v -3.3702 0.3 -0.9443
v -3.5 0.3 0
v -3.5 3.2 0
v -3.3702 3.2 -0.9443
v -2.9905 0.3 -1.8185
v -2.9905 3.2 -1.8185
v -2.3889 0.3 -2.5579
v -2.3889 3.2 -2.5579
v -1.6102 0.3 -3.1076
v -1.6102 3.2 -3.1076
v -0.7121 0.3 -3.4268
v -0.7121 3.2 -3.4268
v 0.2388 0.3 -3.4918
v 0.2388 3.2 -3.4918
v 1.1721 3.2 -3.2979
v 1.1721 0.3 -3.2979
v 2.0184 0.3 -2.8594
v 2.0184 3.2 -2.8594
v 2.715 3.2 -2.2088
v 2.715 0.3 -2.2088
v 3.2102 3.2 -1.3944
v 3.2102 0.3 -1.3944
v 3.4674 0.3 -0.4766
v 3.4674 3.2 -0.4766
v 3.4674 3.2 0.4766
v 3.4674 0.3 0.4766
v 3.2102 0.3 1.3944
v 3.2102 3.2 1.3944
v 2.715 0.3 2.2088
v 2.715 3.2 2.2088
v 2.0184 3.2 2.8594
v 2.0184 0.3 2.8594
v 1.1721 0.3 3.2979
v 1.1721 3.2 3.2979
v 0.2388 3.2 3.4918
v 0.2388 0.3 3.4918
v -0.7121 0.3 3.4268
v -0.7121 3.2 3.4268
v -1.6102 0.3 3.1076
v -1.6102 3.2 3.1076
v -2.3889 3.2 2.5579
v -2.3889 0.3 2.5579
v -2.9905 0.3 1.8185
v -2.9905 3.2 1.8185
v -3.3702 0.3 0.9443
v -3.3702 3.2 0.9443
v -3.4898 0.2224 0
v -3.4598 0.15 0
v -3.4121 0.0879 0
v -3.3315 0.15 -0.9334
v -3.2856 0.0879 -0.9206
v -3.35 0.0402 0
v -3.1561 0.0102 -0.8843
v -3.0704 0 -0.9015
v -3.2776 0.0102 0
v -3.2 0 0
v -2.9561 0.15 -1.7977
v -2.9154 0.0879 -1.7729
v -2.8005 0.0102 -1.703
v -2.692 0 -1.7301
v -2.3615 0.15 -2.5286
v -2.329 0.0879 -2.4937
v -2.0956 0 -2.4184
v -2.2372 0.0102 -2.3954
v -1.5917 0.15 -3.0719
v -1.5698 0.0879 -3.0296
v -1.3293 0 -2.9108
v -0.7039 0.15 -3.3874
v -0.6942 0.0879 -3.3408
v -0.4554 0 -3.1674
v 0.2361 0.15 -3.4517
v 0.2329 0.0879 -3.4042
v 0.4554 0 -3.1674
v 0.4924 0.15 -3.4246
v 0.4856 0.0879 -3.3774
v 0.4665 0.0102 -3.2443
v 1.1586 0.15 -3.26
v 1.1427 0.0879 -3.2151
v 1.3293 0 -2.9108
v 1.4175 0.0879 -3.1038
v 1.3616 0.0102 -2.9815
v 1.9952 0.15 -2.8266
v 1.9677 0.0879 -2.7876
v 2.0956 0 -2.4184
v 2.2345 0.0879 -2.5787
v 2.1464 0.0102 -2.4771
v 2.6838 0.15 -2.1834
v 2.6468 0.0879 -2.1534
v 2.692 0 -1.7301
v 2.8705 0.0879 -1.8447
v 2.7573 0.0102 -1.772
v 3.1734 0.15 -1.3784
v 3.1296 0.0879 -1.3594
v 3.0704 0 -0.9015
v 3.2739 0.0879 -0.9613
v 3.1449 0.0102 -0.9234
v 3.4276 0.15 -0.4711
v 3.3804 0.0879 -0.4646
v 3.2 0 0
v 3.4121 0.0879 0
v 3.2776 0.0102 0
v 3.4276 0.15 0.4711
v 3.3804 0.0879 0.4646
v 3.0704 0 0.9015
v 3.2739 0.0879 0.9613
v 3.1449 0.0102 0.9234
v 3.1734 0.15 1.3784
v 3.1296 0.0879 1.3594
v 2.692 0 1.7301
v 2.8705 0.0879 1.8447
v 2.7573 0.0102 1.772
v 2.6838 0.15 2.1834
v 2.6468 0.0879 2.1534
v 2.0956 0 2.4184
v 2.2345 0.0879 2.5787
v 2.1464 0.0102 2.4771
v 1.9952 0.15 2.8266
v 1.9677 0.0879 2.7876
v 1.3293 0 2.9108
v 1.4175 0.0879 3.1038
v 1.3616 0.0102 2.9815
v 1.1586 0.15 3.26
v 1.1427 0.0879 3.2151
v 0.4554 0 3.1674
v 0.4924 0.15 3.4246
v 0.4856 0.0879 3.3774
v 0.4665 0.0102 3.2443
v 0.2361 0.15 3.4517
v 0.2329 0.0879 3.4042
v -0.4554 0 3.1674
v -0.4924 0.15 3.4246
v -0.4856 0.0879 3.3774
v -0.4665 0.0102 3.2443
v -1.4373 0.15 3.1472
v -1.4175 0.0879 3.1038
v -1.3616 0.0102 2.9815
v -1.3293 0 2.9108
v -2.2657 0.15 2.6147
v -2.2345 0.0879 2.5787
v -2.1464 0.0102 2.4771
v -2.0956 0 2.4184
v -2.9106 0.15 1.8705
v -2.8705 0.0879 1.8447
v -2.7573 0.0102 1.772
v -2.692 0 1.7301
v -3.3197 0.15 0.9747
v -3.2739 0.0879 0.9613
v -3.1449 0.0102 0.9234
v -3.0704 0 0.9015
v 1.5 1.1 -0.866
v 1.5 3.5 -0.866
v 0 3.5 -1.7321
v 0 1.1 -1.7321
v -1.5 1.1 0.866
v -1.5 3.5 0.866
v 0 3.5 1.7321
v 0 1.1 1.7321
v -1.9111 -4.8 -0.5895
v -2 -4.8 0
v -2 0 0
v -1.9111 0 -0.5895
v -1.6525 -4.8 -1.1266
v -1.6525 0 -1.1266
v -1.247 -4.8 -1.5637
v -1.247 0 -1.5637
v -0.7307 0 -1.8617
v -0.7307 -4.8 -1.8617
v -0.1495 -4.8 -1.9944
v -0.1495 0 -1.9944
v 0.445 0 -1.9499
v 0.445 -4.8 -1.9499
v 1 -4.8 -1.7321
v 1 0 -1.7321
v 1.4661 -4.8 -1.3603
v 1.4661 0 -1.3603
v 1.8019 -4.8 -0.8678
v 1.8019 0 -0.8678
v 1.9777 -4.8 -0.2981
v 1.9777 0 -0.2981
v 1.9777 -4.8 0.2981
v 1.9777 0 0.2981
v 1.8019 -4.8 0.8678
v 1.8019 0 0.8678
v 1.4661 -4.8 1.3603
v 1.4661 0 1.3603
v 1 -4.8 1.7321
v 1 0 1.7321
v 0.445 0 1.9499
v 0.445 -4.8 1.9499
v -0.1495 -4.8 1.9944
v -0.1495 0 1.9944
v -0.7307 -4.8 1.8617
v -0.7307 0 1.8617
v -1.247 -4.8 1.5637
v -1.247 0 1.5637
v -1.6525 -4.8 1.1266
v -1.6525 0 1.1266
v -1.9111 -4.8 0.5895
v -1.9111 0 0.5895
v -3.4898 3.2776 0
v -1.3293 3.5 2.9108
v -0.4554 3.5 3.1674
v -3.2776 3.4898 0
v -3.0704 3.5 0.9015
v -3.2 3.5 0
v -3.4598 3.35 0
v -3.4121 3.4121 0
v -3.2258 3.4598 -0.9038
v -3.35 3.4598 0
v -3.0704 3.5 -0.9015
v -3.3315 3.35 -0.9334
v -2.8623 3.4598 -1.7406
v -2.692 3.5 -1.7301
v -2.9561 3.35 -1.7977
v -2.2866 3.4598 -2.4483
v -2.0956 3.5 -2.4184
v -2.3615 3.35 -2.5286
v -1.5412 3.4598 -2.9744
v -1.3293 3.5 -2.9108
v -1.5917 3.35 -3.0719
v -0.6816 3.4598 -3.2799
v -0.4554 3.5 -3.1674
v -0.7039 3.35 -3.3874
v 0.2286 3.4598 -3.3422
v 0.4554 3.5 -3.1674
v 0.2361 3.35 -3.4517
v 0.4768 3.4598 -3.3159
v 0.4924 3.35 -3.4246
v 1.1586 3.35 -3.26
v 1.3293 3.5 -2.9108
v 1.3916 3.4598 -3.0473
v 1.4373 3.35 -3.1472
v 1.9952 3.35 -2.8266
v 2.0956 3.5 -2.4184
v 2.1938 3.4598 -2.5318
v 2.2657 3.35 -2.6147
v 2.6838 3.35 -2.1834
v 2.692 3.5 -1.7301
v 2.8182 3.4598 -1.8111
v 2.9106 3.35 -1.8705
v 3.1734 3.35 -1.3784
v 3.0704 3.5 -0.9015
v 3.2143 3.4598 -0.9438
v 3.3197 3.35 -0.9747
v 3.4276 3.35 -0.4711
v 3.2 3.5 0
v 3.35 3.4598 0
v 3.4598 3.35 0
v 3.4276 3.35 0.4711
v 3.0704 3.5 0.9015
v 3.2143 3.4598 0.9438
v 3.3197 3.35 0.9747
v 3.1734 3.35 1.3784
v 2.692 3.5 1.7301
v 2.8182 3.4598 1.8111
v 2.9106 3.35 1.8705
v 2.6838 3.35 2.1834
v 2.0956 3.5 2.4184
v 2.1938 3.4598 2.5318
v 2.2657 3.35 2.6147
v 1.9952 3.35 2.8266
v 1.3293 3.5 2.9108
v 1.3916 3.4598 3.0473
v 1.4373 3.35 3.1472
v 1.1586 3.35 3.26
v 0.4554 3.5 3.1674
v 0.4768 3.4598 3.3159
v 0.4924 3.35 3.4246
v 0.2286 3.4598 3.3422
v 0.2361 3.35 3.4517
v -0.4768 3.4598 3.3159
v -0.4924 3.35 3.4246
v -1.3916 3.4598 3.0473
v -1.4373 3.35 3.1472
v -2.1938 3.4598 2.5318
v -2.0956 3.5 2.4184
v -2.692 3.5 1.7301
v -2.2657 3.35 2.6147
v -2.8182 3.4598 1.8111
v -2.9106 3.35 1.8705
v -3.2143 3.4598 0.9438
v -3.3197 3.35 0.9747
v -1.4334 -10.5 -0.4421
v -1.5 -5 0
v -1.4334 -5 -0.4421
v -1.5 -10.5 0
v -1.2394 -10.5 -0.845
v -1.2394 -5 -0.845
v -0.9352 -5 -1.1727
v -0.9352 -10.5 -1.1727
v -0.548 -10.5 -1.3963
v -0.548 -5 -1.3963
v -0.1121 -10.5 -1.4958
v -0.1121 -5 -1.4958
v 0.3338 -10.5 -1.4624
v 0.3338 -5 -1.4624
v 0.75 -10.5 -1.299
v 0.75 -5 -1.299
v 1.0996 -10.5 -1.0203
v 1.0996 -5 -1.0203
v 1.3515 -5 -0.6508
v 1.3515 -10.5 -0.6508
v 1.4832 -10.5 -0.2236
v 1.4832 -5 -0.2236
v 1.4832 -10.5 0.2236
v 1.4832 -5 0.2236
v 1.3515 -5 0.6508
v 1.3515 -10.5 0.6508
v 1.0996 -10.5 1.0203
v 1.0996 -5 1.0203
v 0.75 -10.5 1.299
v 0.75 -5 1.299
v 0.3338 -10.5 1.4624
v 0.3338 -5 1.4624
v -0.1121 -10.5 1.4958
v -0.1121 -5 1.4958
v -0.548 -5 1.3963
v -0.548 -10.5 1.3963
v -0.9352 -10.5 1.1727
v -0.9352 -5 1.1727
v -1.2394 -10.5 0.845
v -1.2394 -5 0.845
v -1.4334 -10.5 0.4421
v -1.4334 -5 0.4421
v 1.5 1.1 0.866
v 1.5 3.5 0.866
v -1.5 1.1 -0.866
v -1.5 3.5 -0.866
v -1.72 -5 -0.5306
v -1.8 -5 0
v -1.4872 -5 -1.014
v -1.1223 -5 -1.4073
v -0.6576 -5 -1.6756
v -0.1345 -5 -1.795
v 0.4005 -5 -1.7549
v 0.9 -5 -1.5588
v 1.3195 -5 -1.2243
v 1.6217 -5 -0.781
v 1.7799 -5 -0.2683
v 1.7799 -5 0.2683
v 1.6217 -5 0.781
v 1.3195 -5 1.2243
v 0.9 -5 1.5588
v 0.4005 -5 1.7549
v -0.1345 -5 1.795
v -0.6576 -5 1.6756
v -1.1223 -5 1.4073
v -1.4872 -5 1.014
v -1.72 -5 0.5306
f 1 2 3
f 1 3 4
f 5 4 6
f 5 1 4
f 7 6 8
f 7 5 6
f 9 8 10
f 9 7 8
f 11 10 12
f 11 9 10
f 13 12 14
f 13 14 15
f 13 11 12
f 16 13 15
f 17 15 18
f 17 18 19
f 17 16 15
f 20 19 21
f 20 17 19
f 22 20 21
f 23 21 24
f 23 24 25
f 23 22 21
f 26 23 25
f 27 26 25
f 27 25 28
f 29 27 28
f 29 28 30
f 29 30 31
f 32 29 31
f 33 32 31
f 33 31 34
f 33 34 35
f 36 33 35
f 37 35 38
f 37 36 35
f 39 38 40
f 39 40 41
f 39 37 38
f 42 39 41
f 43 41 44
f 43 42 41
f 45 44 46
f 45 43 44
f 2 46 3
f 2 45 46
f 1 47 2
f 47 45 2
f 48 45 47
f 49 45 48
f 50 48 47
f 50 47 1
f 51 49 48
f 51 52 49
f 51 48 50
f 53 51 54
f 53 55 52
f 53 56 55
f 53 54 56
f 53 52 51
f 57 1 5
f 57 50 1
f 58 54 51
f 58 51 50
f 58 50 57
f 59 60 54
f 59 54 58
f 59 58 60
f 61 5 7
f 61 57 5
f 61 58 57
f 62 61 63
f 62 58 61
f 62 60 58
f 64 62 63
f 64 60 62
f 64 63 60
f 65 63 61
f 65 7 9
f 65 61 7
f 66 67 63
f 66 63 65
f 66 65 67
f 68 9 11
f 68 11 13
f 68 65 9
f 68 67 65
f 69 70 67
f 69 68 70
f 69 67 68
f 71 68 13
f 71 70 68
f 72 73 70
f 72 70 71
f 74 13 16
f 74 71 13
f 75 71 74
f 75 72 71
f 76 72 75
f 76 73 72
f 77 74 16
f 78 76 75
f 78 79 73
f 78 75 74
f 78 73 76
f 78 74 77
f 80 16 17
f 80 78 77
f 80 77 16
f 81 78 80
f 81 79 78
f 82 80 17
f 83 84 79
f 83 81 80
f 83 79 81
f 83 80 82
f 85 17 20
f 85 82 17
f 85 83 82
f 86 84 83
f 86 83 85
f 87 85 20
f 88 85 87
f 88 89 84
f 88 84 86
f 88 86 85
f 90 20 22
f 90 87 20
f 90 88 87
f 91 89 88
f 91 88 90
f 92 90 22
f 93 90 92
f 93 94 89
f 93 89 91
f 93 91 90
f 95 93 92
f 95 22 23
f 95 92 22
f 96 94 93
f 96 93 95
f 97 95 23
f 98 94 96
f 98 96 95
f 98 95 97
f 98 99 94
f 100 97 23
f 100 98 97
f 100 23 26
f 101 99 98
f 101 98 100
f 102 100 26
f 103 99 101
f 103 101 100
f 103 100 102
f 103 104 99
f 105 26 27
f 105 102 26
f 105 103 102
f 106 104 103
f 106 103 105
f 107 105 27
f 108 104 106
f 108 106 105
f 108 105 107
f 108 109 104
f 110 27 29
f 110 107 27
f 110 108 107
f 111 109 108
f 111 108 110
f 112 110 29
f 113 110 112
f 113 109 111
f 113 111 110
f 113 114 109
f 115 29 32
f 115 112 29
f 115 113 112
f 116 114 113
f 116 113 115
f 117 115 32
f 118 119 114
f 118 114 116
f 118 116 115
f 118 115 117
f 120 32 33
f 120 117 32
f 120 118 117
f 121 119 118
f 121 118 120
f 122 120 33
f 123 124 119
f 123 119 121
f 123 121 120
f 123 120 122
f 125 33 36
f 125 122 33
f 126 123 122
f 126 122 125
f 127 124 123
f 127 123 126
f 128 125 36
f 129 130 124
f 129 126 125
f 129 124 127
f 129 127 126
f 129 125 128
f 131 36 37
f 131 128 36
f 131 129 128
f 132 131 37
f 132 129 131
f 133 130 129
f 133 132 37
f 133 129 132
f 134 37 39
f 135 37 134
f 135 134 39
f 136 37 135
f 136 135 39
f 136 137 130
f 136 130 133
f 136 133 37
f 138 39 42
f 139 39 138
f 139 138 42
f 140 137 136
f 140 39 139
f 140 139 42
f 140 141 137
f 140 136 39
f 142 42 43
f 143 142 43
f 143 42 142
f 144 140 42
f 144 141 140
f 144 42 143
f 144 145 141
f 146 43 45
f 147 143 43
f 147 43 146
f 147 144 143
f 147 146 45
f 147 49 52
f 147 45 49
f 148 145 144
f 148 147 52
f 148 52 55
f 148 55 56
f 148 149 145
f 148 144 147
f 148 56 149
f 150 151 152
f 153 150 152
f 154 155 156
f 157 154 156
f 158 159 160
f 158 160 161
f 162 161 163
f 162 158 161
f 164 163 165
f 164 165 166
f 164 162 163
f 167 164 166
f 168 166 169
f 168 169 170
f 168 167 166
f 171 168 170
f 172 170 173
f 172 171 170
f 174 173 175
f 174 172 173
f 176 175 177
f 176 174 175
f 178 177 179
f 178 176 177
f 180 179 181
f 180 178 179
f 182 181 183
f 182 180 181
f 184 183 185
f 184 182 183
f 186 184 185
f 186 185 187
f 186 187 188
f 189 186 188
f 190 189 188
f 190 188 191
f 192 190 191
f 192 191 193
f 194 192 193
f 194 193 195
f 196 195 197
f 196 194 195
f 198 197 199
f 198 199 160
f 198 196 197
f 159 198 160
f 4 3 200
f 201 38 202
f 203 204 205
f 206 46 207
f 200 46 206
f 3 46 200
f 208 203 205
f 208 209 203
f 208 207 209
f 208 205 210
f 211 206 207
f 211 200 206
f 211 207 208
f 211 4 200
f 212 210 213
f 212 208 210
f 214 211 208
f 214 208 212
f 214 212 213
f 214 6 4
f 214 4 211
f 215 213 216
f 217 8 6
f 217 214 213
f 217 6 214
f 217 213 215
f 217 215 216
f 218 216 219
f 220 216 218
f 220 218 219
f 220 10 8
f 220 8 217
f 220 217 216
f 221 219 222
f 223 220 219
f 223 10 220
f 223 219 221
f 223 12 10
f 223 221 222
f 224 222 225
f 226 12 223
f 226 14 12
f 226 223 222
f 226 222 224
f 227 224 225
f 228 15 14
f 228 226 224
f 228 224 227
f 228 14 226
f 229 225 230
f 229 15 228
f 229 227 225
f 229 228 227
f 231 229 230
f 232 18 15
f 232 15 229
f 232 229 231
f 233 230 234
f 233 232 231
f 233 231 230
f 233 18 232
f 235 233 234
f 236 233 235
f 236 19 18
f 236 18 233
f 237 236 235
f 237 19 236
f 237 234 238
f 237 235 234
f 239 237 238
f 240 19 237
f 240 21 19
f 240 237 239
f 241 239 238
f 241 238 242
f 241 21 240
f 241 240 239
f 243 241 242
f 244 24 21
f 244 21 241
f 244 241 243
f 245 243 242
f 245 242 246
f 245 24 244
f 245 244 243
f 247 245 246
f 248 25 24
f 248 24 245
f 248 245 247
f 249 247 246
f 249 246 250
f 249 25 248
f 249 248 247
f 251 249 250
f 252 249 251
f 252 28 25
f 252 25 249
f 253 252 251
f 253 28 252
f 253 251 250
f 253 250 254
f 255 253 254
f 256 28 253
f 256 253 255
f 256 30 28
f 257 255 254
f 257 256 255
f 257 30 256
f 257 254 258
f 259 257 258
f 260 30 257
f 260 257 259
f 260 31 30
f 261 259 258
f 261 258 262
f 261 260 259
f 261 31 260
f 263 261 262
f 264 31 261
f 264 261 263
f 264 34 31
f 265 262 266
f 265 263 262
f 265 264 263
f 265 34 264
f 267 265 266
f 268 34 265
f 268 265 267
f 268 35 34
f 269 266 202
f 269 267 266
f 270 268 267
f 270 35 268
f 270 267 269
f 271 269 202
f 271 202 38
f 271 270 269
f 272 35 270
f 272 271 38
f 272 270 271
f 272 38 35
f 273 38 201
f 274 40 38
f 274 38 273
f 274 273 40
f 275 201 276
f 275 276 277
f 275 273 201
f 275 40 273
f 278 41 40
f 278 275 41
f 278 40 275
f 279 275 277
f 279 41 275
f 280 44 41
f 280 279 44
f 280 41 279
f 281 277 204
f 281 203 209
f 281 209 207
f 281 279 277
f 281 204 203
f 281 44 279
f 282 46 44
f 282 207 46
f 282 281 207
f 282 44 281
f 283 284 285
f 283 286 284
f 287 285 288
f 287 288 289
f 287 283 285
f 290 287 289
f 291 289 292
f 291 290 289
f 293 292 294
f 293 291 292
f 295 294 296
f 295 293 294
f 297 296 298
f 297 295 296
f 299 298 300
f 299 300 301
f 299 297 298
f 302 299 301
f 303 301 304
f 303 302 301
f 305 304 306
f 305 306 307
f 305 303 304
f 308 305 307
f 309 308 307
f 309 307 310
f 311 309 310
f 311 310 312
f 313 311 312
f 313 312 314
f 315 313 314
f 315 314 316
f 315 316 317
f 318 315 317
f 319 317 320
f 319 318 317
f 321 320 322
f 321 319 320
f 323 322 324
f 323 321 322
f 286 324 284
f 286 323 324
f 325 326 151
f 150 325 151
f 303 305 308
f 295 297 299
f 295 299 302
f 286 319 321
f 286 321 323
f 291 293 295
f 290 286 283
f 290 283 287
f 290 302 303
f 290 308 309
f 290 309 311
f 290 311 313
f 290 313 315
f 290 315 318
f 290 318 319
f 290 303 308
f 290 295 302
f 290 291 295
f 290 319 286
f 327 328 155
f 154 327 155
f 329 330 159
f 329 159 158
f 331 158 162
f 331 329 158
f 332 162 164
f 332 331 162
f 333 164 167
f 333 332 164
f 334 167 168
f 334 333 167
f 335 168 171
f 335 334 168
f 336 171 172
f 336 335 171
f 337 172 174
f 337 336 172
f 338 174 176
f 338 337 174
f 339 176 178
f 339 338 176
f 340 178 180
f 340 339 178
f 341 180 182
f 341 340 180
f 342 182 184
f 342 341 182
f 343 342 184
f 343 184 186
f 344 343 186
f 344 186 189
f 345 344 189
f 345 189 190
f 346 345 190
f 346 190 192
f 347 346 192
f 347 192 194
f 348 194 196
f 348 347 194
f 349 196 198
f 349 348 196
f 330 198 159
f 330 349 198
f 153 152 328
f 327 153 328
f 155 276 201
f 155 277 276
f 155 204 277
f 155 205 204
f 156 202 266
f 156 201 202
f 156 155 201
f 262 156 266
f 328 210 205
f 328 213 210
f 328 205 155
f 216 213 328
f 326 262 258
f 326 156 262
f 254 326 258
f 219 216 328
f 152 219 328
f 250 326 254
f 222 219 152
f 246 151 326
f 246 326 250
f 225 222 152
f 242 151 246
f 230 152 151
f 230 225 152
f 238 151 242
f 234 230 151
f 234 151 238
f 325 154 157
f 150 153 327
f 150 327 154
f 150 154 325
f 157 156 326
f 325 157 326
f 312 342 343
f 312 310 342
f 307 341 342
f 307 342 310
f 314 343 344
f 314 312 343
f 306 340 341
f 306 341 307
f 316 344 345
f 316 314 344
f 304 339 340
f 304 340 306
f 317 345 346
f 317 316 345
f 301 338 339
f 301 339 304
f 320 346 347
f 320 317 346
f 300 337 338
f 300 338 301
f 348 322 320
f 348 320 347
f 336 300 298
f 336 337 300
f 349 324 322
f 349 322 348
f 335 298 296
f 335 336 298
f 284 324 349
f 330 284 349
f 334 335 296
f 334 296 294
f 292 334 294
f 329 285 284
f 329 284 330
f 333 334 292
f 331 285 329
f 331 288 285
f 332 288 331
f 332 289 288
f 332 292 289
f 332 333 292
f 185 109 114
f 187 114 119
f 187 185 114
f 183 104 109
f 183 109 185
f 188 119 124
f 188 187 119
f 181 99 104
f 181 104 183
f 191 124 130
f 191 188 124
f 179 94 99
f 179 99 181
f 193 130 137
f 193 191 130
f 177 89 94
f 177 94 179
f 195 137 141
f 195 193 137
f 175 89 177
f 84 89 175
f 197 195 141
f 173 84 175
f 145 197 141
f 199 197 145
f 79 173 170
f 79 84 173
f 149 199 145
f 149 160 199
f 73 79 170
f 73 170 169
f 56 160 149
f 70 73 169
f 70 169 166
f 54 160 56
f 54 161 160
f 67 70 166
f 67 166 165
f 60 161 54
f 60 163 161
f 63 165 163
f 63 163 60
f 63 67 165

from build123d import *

# Parameters (mm, degrees)
FILLET_1_R          = 0.3
CUT_EXTRUDE_1_DEPTH = 2.4
CHAMFER_1_SIZE      = 0.2


with BuildPart() as part:
    # 草图1 → 旋转1 (revolve)
    with BuildSketch(Plane.XY):
        Polygon((0, 3.5), (-3.5, 3.5), (-3.5, 0), (-2, 0), (-2, -5), (-1.5, -5), (-1.5, -10.5), (0, -10.5), align=None)
    revolve(axis=Axis((0, 3.5, 0), (0, -1, 0)))

    # 圆角1
    fillet_1_edges = [part.edges().sort_by_distance(p)[0] for p in [
        (3.5, 0, 0),
        (3.5, 3.5, 0),
    ]]
    fillet(fillet_1_edges, radius=FILLET_1_R)

    # 草图2 → 切除-拉伸1 (cut)
    with BuildSketch(Plane(origin=(0, 3.5, 0), x_dir=(1, 0, 0), z_dir=(0, 1, 0))):
        Polygon((1.5, -0.866025404), (1.5, 0.866025404), (0, 1.732050808), (-1.5, 0.866025404), (-1.5, -0.866025404), (0, -1.732050808), align=None)
    extrude(amount=-CUT_EXTRUDE_1_DEPTH, mode=Mode.SUBTRACT)

    # 倒角1
    chamfer_1_edges = [part.edges().sort_by_distance(p)[0] for p in [
        (2, -5, 0),
    ]]
    chamfer(chamfer_1_edges, length=CHAMFER_1_SIZE)


solid = part.part
